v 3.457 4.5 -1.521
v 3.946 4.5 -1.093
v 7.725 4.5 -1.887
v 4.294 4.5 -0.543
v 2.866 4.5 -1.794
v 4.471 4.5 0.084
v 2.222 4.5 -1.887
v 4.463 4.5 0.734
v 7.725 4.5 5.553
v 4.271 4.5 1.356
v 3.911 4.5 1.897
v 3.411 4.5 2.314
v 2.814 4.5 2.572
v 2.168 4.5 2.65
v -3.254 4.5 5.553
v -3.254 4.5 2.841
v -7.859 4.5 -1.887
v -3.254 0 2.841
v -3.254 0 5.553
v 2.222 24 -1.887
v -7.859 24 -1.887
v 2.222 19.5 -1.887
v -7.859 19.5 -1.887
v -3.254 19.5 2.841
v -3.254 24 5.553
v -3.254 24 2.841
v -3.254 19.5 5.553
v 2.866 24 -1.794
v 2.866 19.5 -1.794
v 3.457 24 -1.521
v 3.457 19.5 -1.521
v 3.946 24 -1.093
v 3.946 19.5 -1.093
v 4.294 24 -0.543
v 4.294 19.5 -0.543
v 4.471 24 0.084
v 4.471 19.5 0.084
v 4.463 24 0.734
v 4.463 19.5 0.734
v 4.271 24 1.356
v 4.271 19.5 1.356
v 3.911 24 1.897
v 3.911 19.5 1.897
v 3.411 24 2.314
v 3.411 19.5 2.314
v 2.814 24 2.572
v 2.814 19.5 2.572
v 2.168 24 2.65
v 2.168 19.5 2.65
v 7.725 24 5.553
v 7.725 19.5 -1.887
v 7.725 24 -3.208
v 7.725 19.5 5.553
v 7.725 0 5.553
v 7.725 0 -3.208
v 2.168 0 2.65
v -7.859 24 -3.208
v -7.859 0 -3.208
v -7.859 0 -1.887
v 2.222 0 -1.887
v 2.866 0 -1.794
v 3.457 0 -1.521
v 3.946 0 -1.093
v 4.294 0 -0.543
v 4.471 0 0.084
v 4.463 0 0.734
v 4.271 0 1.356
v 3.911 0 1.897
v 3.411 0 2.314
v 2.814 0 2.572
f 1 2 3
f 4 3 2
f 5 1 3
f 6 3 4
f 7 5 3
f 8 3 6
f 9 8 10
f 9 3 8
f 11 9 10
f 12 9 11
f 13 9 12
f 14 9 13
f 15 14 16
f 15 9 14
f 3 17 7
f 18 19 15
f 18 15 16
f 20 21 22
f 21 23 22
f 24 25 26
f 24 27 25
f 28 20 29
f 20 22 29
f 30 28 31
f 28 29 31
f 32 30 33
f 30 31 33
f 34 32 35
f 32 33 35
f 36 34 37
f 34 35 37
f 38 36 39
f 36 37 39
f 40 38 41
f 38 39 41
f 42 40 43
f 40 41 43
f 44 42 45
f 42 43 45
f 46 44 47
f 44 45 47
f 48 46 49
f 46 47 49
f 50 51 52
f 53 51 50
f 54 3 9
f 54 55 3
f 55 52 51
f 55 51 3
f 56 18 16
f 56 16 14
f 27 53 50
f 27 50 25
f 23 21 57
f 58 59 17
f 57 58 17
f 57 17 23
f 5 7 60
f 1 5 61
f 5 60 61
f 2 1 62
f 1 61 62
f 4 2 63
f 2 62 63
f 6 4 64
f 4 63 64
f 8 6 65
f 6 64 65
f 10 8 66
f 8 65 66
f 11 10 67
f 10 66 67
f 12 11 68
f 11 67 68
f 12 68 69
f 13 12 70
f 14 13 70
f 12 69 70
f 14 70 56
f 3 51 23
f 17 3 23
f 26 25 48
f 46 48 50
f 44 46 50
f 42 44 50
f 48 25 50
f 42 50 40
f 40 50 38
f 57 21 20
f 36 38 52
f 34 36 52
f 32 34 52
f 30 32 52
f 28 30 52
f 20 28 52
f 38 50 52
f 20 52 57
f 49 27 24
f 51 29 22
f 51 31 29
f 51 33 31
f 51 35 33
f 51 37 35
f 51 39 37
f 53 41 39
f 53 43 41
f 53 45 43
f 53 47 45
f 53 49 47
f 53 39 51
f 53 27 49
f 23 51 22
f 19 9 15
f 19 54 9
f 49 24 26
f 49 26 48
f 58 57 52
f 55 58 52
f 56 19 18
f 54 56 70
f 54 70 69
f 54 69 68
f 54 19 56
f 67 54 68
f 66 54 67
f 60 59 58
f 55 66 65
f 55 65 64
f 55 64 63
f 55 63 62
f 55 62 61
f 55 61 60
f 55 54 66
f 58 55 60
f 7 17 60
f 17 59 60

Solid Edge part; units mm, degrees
sketch "Sketch1" plane through (0, 0, 0) normal (0, -1, 0) x (1, 0, 0)
  line L0 (7.725, 5.5532) -> (-3.2544, 5.5532)
  line L1 (-3.2544, 5.5532) -> (-3.2544, 2.8412)
  line L2 (-3.2544, 2.8412) -> (2.1676, 2.65)
  arc A0 (2.1676, 2.65) -> (2.2221, -1.8869) centre (2.2221, 0.3819) cw
  line L3 (-7.8594, -1.8869) -> (2.2221, -1.8869)
  line L4 (-7.8594, -1.8869) -> (-7.8594, -3.2075)
  line L5 (-7.8594, -3.2075) -> (7.725, -3.2075)
  line L6 (7.725, -3.2075) -> (7.725, 5.5532)
extrude "Protrusion1" add sketch "Sketch1" against normal blind 24
sketch "Sketch2" plane through (4.513, 12, 5.5532) normal (0, 0, 1) x (1, 0, 0)
  line L0 (-20.7401, 7.5) -> (6.9953, 7.5)
  line L1 (6.9953, 7.5) -> (6.9953, -7.5)
  line L2 (6.9953, -7.5) -> (-20.7401, -7.5)
  line L3 (-20.7401, -7.5) -> (-20.7401, 7.5)
extrude "Cutout1" cut sketch "Sketch2" against normal up to vertex (7.4402 mm away)
